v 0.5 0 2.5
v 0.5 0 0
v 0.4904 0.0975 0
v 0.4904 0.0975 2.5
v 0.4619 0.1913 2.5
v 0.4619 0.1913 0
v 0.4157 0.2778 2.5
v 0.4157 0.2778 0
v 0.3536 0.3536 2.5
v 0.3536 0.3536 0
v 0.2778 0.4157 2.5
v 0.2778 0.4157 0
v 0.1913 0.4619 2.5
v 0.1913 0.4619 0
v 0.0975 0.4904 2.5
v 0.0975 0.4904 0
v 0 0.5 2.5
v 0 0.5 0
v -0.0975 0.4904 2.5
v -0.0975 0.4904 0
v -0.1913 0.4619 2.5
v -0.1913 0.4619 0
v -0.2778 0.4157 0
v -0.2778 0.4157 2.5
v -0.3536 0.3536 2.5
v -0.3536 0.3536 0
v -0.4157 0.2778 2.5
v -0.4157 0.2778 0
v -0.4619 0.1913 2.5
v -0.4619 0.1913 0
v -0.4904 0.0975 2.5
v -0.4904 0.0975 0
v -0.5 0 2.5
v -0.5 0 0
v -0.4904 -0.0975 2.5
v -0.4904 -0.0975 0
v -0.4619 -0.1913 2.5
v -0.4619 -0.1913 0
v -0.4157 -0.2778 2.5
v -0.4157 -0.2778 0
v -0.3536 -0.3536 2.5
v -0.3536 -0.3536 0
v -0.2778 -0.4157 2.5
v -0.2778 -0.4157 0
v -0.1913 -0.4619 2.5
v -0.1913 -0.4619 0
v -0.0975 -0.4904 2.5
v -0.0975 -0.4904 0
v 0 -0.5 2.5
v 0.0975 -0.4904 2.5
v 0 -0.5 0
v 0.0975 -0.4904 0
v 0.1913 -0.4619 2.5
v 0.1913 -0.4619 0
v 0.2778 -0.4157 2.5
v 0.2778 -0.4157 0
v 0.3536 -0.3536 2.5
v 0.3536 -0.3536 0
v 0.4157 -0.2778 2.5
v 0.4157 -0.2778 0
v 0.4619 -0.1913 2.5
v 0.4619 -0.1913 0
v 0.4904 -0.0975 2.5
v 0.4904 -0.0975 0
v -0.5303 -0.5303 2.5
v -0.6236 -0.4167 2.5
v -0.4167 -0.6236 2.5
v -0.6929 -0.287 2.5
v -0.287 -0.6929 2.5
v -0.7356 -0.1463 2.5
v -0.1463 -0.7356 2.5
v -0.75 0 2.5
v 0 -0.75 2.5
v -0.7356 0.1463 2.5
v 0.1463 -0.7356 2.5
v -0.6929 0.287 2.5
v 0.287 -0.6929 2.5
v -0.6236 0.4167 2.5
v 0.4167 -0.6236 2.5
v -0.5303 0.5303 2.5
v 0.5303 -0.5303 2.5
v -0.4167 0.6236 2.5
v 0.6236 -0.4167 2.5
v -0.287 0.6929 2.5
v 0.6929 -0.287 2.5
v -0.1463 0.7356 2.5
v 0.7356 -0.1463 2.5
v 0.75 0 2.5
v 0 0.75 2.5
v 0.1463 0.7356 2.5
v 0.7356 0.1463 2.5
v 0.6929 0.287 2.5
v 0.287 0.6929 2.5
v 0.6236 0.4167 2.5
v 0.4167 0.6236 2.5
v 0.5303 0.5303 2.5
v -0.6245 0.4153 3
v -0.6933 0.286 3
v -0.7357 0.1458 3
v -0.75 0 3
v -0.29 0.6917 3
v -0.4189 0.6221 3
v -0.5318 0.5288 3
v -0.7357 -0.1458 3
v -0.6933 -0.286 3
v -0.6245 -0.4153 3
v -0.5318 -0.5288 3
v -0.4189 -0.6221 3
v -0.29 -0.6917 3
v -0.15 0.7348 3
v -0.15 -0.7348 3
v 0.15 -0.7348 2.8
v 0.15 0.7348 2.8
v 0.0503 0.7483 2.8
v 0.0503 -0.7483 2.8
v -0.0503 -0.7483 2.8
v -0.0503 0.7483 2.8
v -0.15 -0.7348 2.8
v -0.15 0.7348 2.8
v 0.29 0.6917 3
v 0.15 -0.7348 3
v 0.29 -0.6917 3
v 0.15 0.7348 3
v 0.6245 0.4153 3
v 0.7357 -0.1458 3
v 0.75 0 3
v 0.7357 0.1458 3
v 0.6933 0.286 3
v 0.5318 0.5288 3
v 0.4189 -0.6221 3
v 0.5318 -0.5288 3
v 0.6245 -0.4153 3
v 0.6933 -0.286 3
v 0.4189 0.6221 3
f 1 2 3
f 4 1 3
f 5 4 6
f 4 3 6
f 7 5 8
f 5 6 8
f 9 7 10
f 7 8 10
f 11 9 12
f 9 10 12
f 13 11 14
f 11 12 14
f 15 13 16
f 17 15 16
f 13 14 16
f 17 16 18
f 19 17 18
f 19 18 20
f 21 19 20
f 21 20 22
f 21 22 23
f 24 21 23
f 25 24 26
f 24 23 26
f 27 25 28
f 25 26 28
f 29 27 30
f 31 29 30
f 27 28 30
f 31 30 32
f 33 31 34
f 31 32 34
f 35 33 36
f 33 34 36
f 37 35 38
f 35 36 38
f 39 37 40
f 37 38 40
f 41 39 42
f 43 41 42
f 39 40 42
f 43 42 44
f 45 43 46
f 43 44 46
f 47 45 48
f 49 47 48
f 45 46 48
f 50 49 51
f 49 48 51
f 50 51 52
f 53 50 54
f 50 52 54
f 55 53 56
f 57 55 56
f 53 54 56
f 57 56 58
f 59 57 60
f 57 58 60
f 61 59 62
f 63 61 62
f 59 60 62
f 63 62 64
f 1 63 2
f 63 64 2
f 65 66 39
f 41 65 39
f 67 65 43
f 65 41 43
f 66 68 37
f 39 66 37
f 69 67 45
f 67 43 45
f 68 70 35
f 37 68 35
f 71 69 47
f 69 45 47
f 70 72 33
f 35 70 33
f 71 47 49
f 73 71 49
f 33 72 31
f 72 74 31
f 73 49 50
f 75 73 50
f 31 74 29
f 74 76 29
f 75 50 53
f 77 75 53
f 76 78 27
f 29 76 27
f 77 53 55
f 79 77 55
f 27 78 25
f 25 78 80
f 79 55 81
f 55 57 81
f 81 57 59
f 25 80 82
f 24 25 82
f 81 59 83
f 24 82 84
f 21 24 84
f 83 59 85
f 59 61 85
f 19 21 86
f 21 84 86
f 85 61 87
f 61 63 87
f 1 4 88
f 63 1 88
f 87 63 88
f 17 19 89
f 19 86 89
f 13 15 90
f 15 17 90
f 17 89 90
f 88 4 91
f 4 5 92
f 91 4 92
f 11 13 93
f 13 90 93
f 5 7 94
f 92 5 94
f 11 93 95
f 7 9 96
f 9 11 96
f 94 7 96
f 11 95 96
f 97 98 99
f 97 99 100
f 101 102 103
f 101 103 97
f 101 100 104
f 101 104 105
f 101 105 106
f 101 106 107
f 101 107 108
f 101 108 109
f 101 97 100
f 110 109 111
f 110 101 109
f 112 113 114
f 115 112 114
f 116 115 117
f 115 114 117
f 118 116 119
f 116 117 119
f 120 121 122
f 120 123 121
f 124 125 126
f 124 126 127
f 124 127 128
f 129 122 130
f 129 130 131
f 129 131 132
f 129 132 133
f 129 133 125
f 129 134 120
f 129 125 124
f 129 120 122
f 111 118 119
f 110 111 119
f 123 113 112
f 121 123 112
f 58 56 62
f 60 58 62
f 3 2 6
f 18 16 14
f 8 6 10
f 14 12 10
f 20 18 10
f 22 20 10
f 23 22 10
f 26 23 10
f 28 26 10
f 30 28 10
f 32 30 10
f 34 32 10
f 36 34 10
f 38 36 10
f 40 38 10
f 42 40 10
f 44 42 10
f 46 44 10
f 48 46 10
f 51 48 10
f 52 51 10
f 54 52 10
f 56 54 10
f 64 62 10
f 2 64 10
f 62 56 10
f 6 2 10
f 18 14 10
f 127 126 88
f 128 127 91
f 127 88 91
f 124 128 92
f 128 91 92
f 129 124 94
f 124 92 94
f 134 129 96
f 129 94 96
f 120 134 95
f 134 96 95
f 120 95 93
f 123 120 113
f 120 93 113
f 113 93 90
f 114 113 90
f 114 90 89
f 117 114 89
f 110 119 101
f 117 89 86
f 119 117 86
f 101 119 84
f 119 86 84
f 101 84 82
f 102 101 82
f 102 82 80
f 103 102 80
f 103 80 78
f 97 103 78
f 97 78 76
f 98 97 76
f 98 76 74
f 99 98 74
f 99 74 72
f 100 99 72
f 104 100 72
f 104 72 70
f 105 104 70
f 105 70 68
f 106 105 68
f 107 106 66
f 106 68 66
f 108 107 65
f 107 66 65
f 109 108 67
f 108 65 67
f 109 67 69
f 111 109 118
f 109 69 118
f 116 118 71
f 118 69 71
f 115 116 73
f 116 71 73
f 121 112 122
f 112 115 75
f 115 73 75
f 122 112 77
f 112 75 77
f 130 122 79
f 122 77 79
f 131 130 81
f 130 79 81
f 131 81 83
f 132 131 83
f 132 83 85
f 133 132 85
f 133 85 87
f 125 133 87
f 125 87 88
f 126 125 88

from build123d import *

# Parameters (mm, degrees)
SKETCH1_R           = 0.5
BOSS_EXTRUDE1_DEPTH = 2.5
SKETCH2_R           = 0.75
BOSS_EXTRUDE2_DEPTH = 0.5
CUT_EXTRUDE1_START  = -0.2
CUT_EXTRUDE1_DEPTH  = 0.2


with BuildPart() as part:
    # Sketch1 → Boss-Extrude1 (new body)
    with BuildSketch(Plane.XY):
        Circle(SKETCH1_R)
    extrude(amount=BOSS_EXTRUDE1_DEPTH)

    # Sketch2 → Boss-Extrude2 (add)
    with BuildSketch(Plane.XY.offset(2.5)):
        Circle(SKETCH2_R)
    extrude(amount=BOSS_EXTRUDE2_DEPTH)

    # Sketch3 → Cut-Extrude1 (cut)
    with BuildSketch(Plane.XY.offset(3).offset(CUT_EXTRUDE1_START)):
        with BuildLine():
            Line((0.15, 0.734846923), (0.15, -0.734846923))
            ThreePointArc((0.15, -0.734846923), (0, -0.75), (-0.15, -0.734846923))
            Line((-0.15, -0.734846923), (-0.15, 0.734846923))
            ThreePointArc((-0.15, 0.734846923), (0, 0.75), (0.15, 0.734846923))
        make_face()
    extrude(amount=CUT_EXTRUDE1_DEPTH, mode=Mode.SUBTRACT)


solid = part.part
